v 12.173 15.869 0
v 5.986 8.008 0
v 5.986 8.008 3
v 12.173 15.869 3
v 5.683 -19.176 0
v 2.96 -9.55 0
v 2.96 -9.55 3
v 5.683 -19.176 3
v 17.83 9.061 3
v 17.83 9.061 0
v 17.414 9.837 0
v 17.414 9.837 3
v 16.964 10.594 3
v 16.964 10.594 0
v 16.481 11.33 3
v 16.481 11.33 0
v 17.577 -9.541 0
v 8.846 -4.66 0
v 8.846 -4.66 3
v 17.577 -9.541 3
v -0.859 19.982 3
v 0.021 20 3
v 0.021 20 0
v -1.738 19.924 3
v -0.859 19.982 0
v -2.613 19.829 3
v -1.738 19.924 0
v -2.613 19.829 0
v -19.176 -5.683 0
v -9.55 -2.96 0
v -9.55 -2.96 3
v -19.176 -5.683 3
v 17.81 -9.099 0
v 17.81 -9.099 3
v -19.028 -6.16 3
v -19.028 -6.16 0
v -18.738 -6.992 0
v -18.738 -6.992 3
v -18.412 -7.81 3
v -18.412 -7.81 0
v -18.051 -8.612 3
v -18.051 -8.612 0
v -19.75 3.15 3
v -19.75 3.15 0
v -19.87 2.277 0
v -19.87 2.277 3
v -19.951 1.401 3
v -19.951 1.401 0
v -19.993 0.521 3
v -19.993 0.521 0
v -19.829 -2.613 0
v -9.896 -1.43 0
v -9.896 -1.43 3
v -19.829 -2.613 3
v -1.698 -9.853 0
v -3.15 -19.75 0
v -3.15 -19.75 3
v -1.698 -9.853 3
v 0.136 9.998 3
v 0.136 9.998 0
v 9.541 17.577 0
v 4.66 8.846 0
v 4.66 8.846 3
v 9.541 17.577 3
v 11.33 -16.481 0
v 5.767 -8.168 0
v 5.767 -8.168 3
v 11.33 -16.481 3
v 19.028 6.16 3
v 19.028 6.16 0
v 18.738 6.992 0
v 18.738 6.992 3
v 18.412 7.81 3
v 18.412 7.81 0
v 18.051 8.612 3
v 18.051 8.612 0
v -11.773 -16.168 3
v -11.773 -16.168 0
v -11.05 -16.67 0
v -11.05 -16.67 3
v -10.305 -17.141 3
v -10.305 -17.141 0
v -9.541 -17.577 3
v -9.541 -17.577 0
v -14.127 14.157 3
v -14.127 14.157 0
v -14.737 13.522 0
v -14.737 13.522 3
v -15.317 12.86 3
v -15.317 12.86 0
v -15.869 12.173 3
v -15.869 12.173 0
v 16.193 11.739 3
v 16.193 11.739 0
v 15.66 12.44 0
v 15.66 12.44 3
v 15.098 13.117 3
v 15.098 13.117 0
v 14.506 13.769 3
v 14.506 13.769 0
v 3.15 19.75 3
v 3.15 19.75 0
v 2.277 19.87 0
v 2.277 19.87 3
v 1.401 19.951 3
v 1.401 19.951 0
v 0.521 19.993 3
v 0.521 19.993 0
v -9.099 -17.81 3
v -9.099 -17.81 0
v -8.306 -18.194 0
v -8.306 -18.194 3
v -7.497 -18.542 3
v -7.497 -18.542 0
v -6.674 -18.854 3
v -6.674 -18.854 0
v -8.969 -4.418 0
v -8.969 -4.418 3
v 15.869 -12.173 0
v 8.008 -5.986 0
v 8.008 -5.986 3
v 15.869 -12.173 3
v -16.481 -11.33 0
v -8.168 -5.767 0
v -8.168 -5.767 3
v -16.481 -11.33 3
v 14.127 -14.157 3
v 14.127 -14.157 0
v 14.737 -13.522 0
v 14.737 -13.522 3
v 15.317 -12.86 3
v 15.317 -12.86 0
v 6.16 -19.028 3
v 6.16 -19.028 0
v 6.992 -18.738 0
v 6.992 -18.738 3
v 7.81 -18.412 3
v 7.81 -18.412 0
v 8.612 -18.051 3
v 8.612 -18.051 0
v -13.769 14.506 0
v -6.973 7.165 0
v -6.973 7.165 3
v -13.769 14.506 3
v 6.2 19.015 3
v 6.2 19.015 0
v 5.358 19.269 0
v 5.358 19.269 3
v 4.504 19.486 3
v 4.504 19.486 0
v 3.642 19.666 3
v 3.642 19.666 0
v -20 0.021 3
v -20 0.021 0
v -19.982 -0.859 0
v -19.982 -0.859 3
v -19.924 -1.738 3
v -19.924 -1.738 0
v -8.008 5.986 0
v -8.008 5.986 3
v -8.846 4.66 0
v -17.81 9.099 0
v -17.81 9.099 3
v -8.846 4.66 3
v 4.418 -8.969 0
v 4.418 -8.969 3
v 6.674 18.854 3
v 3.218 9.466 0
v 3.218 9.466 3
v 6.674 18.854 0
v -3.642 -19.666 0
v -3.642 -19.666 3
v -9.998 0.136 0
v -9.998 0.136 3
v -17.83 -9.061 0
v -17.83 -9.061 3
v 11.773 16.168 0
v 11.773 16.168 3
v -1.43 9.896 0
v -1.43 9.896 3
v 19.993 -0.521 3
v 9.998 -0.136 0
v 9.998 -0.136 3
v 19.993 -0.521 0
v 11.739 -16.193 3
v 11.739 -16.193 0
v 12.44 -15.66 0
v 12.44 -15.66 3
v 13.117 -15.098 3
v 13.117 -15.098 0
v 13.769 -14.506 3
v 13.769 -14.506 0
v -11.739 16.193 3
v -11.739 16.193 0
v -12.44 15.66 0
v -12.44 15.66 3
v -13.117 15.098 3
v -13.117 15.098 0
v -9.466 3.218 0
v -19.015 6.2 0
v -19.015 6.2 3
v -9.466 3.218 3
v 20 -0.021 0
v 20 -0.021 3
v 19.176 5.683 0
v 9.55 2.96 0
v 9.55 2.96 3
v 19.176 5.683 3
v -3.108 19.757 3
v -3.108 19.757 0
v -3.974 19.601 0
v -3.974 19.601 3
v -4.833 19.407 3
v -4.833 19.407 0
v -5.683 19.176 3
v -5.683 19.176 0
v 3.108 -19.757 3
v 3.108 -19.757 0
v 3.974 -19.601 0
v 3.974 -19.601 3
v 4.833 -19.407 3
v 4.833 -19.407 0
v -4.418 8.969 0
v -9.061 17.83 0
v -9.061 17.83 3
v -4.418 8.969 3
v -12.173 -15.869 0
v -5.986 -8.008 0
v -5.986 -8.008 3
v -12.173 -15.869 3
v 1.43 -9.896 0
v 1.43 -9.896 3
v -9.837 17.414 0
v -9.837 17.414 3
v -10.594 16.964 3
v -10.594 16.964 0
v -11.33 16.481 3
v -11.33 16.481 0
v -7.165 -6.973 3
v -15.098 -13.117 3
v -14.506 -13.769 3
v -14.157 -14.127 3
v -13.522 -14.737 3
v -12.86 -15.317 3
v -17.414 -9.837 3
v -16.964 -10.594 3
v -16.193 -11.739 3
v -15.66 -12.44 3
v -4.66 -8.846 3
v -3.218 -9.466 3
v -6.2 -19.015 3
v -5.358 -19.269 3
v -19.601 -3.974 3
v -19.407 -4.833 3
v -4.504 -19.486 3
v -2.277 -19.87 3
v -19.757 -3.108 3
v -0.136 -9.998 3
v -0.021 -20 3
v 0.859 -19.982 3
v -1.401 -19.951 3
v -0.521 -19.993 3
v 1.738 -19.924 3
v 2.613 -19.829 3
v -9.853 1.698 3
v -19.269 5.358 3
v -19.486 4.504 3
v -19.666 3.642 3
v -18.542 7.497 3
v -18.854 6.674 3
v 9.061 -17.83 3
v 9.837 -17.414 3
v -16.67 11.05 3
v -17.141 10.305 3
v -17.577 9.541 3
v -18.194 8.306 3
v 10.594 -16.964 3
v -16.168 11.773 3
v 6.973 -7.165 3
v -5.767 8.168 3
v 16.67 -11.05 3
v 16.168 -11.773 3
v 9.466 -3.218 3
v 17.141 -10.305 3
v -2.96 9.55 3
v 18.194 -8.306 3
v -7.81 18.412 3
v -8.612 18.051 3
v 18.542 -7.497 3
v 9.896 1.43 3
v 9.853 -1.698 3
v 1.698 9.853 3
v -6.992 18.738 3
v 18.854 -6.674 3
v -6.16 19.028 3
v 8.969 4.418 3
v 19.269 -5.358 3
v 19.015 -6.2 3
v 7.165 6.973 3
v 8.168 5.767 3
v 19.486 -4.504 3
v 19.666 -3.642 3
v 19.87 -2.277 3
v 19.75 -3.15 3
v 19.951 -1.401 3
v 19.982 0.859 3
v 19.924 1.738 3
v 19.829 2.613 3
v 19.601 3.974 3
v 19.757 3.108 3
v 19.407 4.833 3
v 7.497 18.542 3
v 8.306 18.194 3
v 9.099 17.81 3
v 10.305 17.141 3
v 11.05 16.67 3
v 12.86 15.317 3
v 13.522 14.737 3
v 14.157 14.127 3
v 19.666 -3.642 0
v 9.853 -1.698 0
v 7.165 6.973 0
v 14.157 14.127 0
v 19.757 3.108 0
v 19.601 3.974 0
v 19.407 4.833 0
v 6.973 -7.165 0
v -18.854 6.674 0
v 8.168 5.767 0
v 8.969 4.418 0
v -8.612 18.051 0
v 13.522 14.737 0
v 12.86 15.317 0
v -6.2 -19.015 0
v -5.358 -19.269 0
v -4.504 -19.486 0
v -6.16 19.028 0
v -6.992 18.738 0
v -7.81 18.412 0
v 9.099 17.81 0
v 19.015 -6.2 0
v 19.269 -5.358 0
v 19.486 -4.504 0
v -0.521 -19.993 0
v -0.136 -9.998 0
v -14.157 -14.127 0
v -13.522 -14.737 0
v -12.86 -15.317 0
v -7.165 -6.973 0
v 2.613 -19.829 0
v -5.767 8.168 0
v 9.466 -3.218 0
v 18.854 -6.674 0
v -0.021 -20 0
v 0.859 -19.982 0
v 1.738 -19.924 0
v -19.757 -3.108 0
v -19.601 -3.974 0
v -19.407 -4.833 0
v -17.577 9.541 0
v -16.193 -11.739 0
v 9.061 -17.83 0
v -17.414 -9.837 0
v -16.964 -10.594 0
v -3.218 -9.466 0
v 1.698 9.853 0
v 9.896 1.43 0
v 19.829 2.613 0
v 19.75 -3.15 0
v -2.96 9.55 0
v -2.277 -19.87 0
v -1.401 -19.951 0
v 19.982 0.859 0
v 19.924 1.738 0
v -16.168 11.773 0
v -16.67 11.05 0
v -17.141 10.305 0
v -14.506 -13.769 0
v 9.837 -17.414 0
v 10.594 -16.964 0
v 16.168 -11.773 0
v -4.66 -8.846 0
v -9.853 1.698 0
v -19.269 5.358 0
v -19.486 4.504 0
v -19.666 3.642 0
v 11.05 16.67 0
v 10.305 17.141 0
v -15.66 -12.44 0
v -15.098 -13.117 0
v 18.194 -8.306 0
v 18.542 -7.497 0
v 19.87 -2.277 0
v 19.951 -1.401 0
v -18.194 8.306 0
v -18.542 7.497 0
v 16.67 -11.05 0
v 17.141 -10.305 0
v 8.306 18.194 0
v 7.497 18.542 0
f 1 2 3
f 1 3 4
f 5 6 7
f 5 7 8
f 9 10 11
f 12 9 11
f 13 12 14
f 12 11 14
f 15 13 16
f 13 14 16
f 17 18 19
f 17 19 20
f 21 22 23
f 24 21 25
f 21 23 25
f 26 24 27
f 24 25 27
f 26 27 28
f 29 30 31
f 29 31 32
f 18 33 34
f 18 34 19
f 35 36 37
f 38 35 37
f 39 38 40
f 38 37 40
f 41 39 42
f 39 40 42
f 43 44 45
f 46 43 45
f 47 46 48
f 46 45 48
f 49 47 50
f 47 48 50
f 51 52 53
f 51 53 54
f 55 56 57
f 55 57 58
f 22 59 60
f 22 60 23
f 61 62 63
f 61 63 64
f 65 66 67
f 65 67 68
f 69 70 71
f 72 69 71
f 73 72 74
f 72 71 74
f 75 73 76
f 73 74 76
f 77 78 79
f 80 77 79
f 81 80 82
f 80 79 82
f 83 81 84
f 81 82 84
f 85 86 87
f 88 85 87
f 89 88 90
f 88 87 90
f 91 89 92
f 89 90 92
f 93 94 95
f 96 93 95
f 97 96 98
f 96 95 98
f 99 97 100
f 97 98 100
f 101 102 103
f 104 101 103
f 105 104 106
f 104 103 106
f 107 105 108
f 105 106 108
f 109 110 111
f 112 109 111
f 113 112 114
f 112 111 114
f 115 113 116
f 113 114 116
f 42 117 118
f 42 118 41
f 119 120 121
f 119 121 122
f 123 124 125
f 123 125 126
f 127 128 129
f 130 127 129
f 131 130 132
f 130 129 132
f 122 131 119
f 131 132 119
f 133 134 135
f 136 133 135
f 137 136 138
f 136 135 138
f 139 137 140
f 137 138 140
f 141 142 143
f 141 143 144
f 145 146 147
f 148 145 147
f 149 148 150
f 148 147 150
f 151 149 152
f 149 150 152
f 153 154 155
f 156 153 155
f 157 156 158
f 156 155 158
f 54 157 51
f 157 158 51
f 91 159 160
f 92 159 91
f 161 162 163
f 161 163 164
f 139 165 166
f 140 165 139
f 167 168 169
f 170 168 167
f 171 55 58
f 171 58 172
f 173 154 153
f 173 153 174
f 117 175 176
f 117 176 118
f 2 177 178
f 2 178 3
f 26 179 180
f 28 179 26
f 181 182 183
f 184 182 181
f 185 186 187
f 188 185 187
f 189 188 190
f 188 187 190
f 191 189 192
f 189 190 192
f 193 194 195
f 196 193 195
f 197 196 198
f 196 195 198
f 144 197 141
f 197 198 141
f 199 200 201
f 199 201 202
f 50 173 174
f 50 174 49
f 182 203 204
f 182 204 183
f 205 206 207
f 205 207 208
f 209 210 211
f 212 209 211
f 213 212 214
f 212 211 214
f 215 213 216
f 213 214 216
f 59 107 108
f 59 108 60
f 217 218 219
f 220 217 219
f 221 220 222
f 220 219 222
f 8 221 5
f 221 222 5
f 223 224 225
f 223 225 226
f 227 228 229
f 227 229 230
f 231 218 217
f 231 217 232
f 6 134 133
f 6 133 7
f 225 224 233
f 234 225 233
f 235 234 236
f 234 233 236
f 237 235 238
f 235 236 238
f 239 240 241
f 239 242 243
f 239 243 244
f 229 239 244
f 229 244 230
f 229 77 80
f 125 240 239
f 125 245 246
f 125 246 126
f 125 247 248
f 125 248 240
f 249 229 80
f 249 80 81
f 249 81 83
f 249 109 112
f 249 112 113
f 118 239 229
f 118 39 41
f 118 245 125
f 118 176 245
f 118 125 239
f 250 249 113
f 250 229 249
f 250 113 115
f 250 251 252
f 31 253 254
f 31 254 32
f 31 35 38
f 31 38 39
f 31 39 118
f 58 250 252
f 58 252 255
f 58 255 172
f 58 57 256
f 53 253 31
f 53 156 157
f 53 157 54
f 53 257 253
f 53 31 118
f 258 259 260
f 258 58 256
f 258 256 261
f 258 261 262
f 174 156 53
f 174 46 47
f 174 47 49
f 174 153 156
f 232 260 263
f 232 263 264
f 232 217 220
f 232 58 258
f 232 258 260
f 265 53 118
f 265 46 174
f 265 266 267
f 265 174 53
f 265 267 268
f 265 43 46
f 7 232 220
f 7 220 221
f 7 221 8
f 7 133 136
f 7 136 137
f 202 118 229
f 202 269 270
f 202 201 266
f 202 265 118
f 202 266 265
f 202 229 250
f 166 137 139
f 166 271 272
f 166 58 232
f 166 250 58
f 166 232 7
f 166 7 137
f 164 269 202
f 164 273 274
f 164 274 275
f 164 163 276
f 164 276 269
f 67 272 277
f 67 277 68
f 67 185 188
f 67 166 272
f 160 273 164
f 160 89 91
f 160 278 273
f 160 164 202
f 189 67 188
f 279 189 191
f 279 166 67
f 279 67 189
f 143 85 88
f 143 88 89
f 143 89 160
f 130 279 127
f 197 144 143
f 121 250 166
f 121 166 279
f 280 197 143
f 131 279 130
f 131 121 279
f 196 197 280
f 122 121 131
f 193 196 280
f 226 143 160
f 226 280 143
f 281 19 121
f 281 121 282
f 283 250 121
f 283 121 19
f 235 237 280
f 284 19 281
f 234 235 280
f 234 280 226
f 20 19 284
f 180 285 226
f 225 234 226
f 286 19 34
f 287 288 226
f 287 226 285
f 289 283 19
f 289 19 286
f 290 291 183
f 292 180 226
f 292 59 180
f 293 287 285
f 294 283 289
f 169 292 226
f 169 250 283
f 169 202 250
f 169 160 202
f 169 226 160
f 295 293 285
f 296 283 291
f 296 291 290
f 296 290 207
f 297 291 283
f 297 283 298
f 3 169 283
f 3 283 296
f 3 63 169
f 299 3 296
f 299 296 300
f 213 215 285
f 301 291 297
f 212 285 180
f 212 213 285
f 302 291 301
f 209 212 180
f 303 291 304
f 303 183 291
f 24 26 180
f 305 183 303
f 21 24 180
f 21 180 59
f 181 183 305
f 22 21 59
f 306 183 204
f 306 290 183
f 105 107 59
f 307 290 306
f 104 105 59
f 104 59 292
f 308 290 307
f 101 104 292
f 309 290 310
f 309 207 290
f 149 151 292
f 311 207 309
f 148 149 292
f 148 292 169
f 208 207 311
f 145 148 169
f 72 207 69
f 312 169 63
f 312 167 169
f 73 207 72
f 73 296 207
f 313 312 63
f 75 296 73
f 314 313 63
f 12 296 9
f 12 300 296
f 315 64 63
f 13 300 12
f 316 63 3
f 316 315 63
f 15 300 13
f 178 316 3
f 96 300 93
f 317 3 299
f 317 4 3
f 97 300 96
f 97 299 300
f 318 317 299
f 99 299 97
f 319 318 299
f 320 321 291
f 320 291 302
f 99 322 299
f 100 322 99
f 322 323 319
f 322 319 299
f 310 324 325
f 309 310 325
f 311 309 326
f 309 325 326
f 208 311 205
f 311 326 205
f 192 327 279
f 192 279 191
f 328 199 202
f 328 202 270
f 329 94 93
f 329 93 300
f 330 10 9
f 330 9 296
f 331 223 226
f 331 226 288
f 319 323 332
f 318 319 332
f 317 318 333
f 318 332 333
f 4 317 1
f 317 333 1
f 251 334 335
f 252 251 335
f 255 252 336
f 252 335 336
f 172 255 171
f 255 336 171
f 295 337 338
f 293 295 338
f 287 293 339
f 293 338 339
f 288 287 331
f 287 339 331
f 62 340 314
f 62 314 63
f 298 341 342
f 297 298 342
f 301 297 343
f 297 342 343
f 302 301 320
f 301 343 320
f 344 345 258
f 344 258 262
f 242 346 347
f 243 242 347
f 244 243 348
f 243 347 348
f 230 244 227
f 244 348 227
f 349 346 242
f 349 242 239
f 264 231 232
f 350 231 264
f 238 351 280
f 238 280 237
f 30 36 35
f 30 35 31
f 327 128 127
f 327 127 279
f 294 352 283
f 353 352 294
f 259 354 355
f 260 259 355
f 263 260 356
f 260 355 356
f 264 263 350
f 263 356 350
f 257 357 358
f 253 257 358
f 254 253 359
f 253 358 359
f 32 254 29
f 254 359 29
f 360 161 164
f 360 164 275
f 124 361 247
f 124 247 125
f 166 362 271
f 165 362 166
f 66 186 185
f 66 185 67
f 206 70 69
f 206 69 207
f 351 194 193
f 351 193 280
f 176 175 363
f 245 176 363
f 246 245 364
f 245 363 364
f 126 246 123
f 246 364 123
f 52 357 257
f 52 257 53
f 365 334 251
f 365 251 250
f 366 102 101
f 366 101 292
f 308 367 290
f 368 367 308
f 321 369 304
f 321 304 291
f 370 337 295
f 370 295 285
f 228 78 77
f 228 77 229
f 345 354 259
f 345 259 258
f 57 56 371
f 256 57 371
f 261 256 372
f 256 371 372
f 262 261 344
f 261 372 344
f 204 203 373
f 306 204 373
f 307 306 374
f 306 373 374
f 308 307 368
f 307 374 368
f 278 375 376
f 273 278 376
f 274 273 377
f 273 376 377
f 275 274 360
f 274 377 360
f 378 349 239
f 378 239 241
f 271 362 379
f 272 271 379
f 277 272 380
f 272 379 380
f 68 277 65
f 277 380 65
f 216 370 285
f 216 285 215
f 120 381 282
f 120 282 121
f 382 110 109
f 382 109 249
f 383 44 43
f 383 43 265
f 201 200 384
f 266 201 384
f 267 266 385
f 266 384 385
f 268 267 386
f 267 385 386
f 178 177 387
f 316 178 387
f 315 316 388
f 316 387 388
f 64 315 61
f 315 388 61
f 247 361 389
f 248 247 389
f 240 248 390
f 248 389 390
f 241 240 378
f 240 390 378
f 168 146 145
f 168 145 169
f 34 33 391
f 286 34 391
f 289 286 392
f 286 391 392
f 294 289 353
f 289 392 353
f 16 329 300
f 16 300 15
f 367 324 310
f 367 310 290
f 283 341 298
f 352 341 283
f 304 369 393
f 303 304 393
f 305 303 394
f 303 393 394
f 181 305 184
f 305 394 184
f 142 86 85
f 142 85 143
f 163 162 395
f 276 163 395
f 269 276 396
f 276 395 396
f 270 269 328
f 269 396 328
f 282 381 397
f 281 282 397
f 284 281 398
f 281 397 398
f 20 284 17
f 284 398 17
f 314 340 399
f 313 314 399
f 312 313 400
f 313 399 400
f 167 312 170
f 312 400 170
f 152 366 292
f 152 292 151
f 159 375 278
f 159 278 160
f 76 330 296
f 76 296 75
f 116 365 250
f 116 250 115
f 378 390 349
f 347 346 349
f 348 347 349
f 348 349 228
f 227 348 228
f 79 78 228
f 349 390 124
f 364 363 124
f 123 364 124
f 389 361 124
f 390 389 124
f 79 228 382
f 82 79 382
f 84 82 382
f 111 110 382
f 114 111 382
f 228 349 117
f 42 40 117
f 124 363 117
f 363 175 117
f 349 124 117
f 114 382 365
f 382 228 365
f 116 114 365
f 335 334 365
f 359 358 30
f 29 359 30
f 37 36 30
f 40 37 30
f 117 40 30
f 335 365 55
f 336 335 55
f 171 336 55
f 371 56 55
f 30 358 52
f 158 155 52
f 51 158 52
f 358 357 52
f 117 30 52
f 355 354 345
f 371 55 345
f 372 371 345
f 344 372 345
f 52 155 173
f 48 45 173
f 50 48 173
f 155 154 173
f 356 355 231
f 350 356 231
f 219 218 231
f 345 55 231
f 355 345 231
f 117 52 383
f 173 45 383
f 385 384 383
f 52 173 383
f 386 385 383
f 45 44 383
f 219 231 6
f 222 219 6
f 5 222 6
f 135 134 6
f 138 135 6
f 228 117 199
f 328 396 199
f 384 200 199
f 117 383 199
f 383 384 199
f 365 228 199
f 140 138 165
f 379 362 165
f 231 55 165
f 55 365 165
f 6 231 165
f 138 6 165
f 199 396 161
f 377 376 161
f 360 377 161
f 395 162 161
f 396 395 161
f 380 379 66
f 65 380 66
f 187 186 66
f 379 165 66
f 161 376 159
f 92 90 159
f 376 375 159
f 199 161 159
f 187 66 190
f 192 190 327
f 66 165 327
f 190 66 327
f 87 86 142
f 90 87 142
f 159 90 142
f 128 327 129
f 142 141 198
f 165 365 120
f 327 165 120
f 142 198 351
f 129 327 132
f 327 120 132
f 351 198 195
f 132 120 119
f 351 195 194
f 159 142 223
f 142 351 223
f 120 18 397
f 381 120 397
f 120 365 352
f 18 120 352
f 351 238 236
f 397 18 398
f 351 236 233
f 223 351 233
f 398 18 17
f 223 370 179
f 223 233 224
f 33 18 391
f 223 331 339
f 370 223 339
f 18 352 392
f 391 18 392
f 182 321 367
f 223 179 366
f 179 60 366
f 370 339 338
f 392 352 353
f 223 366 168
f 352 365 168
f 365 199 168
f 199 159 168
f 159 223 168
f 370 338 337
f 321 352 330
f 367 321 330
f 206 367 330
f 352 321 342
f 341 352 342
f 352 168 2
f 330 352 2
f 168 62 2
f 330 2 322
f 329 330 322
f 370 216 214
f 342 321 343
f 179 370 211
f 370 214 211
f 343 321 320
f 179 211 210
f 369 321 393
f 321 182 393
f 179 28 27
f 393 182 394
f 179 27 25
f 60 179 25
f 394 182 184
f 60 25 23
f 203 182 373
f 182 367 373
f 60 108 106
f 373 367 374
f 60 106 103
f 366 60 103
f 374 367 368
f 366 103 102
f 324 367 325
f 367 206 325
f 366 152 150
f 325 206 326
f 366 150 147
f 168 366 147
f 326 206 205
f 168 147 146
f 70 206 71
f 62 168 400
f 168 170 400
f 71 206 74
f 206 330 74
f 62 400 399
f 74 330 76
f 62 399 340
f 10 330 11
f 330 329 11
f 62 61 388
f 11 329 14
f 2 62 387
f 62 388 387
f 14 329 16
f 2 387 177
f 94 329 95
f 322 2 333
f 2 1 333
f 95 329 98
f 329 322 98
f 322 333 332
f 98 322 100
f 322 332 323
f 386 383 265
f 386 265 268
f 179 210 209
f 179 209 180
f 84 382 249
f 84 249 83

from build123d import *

# Parameters (mm, degrees)
SKETCH1_R           = 20
BOSS_EXTRUDE1_DEPTH = 3
CUT_EXTRUDE5_DEPTH  = 29.442925307
CIRPATTERN1_DEPTH   = 3


# Read off the part's stored shape, not the designer's step: CirPattern1
with BuildPart() as part:
    # Sketch1 → Boss-Extrude1 (new body)
    with BuildSketch(Plane.XY):
        Circle(SKETCH1_R)
    extrude(amount=BOSS_EXTRUDE1_DEPTH)

    # Sketch2 → Cut-Extrude5 (cut, through all)
    with BuildSketch(Plane.XY.offset(3)):
        Polygon((0.021198778, 19.999988765), (0.521152809, 19.993208841), (0.135577303, 9.997518193), align=None)
    extrude(amount=-CUT_EXTRUDE5_DEPTH, mode=Mode.SUBTRACT)


with BuildPart() as cut_extrude5_kept_piece:
    # of the separate pieces the step leaves, the one the design keeps (cut_extrude5_pieces_kept)
    add(part.part.solids().sort_by_distance((20, 0, 0))[0])

    # CirPattern1 outline → CirPattern1 (cut)
    with BuildSketch(Plane.XY):
        with BuildLine():
            Line((-3.107749756, 19.757071931), (-1.430048289, 9.895641117))
            Line((-1.430048289, 9.895641117), (-2.612890376, 19.828585521))
            ThreePointArc((-2.612890376, 19.828585521), (-2.860543555, 19.794375222), (-3.107749756, 19.757071931))
        make_face()
        with BuildLine():
            Line((1.697864531, 9.853223191), (3.642363483, 19.665533006))
            ThreePointArc((3.642363483, 19.665533006), (3.396259749, 19.709526119), (3.149625329, 19.750439499))
            Line((3.149625329, 19.750439499), (1.697864531, 9.853223191))
        make_face()
        with BuildLine():
            Line((3.2183447, 9.466309133), (6.673887081, 18.853626482))
            ThreePointArc((6.673887081, 18.853626482), (6.437695332, 18.935577073), (6.200497654, 19.014568864))
            Line((6.200497654, 19.014568864), (3.2183447, 9.466309133))
        make_face()
        with BuildLine():
            Line((4.659578542, 8.846303128), (9.541077431, 17.577481101))
            ThreePointArc((9.541077431, 17.577481101), (9.320613491, 17.695371275), (9.098693148, 17.810496438))
            Line((9.098693148, 17.810496438), (4.659578542, 8.846303128))
        make_face()
        with BuildLine():
            Line((5.986078095, 8.00847178), (12.17333479, 15.868519799))
            ThreePointArc((12.17333479, 15.868519799), (11.974027213, 16.019446707), (11.772848622, 16.167870479))
            Line((11.772848622, 16.167870479), (5.986078095, 8.00847178))
        make_face()
        with BuildLine():
            Line((7.165180539, 6.973445279), (14.505844245, 13.768822875))
            ThreePointArc((14.505844245, 13.768822875), (14.332600646, 13.949070196), (14.15711749, 14.127137891))
            Line((14.15711749, 14.127137891), (7.165180539, 6.973445279))
        make_face()
        with BuildLine():
            Line((8.167852459, 5.766709411), (16.481171674, 11.330091834))
            ThreePointArc((16.481171674, 11.330091834), (16.338257884, 11.535221282), (16.192791142, 11.73854828))
            Line((16.192791142, 11.73854828), (8.167852459, 5.766709411))
        make_face()
        with BuildLine():
            Line((8.969404743, 4.417978019), (18.050677958, 8.612376328))
            ThreePointArc((18.050677958, 8.612376328), (17.94161299, 8.837336935), (17.829744535, 9.060916653))
            Line((17.829744535, 9.060916653), (8.969404743, 4.417978019))
        make_face()
        with BuildLine():
            Line((9.550100515, 2.960461346), (19.175716644, 5.682595535))
            ThreePointArc((19.175716644, 5.682595535), (19.103186038, 5.921848023), (19.027670443, 6.160175186))
            Line((19.027670443, 6.160175186), (9.550100515, 2.960461346))
        make_face()
        with BuildLine():
            Line((9.895641117, 1.430048289), (19.828585545, 2.612890379))
            ThreePointArc((19.828585545, 2.612890379), (19.794375247, 2.860543558), (19.757071956, 3.10774976))
            Line((19.757071956, 3.10774976), (9.895641117, 1.430048289))
        make_face()
        with BuildLine():
            Line((9.997518193, -0.135577303), (19.993208862, -0.52115281))
            ThreePointArc((19.993208862, -0.52115281), (19.998161242, -0.271196982), (19.999988787, -0.021198778))
            Line((19.999988787, -0.021198778), (9.997518193, -0.135577303))
        make_face()
        with BuildLine():
            Line((9.853223191, -1.697864531), (19.665533023, -3.642363486))
            ThreePointArc((19.665533023, -3.642363486), (19.709526137, -3.396259752), (19.750439517, -3.149625332))
            Line((19.750439517, -3.149625332), (9.853223191, -1.697864531))
        make_face()
        with BuildLine():
            Line((9.466309133, -3.2183447), (18.853626494, -6.673887086))
            ThreePointArc((18.853626494, -6.673887086), (18.935577086, -6.437695337), (19.014568878, -6.200497658))
            Line((19.014568878, -6.200497658), (9.466309133, -3.2183447))
        make_face()
        with BuildLine():
            Line((8.846303128, -4.659578542), (17.577481109, -9.541077435))
            ThreePointArc((17.577481109, -9.541077435), (17.695371283, -9.320613495), (17.810496447, -9.098693153))
            Line((17.810496447, -9.098693153), (8.846303128, -4.659578542))
        make_face()
        with BuildLine():
            Line((8.00847178, -5.986078095), (15.868519802, -12.173334792))
            ThreePointArc((15.868519802, -12.173334792), (16.019446711, -11.974027216), (16.167870483, -11.772848624))
            Line((16.167870483, -11.772848624), (8.00847178, -5.986078095))
        make_face()
        with BuildLine():
            Line((6.973445279, -7.165180539), (13.768822874, -14.505844245))
            ThreePointArc((13.768822874, -14.505844245), (13.949070196, -14.332600646), (14.127137891, -14.15711749))
            Line((14.127137891, -14.15711749), (6.973445279, -7.165180539))
        make_face()
        with BuildLine():
            Line((5.766709411, -8.167852459), (11.330091831, -16.481171669))
            ThreePointArc((11.330091831, -16.481171669), (11.535221279, -16.33825788), (11.738548277, -16.192791138))
            Line((11.738548277, -16.192791138), (5.766709411, -8.167852459))
        make_face()
        with BuildLine():
            Line((4.417978019, -8.969404743), (8.612376324, -18.050677949))
            ThreePointArc((8.612376324, -18.050677949), (8.83733693, -17.941612981), (9.060916649, -17.829744526))
            Line((9.060916649, -17.829744526), (4.417978019, -8.969404743))
        make_face()
        with BuildLine():
            Line((2.960461346, -9.550100515), (5.682595531, -19.17571663))
            ThreePointArc((5.682595531, -19.17571663), (5.921848019, -19.103186025), (6.160175182, -19.02767043))
            Line((6.160175182, -19.02767043), (2.960461346, -9.550100515))
        make_face()
        with BuildLine():
            Line((1.430048289, -9.895641117), (2.612890376, -19.828585527))
            ThreePointArc((2.612890376, -19.828585527), (2.860543556, -19.794375229), (3.107749758, -19.757071938))
            Line((3.107749758, -19.757071938), (1.430048289, -9.895641117))
        make_face()
        with BuildLine():
            Line((-0.135577303, -9.997518193), (-0.521152809, -19.99320884))
            ThreePointArc((-0.521152809, -19.99320884), (-0.271196982, -19.99816122), (-0.021198778, -19.999988765))
            Line((-0.021198778, -19.999988765), (-0.135577303, -9.997518193))
        make_face()
        with BuildLine():
            Line((-1.697864531, -9.853223191), (-3.642363481, -19.665532998))
            ThreePointArc((-3.642363481, -19.665532998), (-3.396259748, -19.709526112), (-3.149625328, -19.750439493))
            Line((-3.149625328, -19.750439493), (-1.697864531, -9.853223191))
        make_face()
        with BuildLine():
            Line((-3.2183447, -9.466309133), (-6.673887077, -18.853626468))
            ThreePointArc((-6.673887077, -18.853626468), (-6.437695328, -18.93557706), (-6.20049765, -19.014568852))
            Line((-6.20049765, -19.014568852), (-3.2183447, -9.466309133))
        make_face()
        with BuildLine():
            Line((-4.659578542, -8.846303128), (-9.541077421, -17.577481083))
            ThreePointArc((-9.541077421, -17.577481083), (-9.320613482, -17.695371257), (-9.098693139, -17.810496421))
            Line((-9.098693139, -17.810496421), (-4.659578542, -8.846303128))
        make_face()
        with BuildLine():
            Line((-5.986078095, -8.00847178), (-12.173334774, -15.868519778))
            ThreePointArc((-12.173334774, -15.868519778), (-11.974027198, -16.019446687), (-11.772848606, -16.167870459))
            Line((-11.772848606, -16.167870459), (-5.986078095, -8.00847178))
        make_face()
        with BuildLine():
            Line((-7.165180539, -6.973445279), (-14.505844222, -13.768822853))
            ThreePointArc((-14.505844222, -13.768822853), (-14.332600623, -13.949070175), (-14.157117468, -14.127137869))
            Line((-14.157117468, -14.127137869), (-7.165180539, -6.973445279))
        make_face()
        with BuildLine():
            Line((-8.167852459, -5.766709411), (-16.481171644, -11.330091814))
            ThreePointArc((-16.481171644, -11.330091814), (-16.338257855, -11.535221261), (-16.192791114, -11.738548259))
            Line((-16.192791114, -11.738548259), (-8.167852459, -5.766709411))
        make_face()
        with BuildLine():
            Line((-8.969404743, -4.417978019), (-18.050677923, -8.612376311))
            ThreePointArc((-18.050677923, -8.612376311), (-17.941612955, -8.837336918), (-17.8297445, -9.060916636))
            Line((-17.8297445, -9.060916636), (-8.969404743, -4.417978019))
        make_face()
        with BuildLine():
            Line((-9.550100515, -2.960461346), (-19.175716604, -5.682595523))
            ThreePointArc((-19.175716604, -5.682595523), (-19.103185999, -5.921848011), (-19.027670404, -6.160175173))
            Line((-19.027670404, -6.160175173), (-9.550100515, -2.960461346))
        make_face()
        with BuildLine():
            Line((-9.895641117, -1.430048289), (-19.828585502, -2.612890373))
            ThreePointArc((-19.828585502, -2.612890373), (-19.794375204, -2.860543552), (-19.757071914, -3.107749754))
            Line((-19.757071914, -3.107749754), (-9.895641117, -1.430048289))
        make_face()
        with BuildLine():
            Line((-9.997518193, 0.135577303), (-19.993208819, 0.521152808))
            ThreePointArc((-19.993208819, 0.521152808), (-19.998161198, 0.271196981), (-19.999988743, 0.021198778))
            Line((-19.999988743, 0.021198778), (-9.997518193, 0.135577303))
        make_face()
        with BuildLine():
            Line((-9.853223191, 1.697864531), (-19.665532981, 3.642363478))
            ThreePointArc((-19.665532981, 3.642363478), (-19.709526095, 3.396259745), (-19.750439475, 3.149625326))
            Line((-19.750439475, 3.149625326), (-9.853223191, 1.697864531))
        make_face()
        with BuildLine():
            Line((-9.466309133, 3.2183447), (-18.853626455, 6.673887072))
            ThreePointArc((-18.853626455, 6.673887072), (-18.935577047, 6.437695323), (-19.014568838, 6.200497646))
            Line((-19.014568838, 6.200497646), (-9.466309133, 3.2183447))
        make_face()
        with BuildLine():
            Line((-8.846303128, 4.659578542), (-17.577481075, 9.541077417))
            ThreePointArc((-17.577481075, 9.541077417), (-17.695371249, 9.320613477), (-17.810496412, 9.098693135))
            Line((-17.810496412, 9.098693135), (-8.846303128, 4.659578542))
        make_face()
        with BuildLine():
            Line((-8.00847178, 5.986078095), (-15.868519775, 12.173334771))
            ThreePointArc((-15.868519775, 12.173334771), (-16.019446683, 11.974027195), (-16.167870455, 11.772848604))
            Line((-16.167870455, 11.772848604), (-8.00847178, 5.986078095))
        make_face()
        with BuildLine():
            Line((-6.973445279, 7.165180539), (-13.768822853, 14.505844223))
            ThreePointArc((-13.768822853, 14.505844223), (-13.949070175, 14.332600624), (-14.127137869, 14.157117468))
            Line((-14.127137869, 14.157117468), (-6.973445279, 7.165180539))
        make_face()
        with BuildLine():
            Line((-5.766709411, 8.167852459), (-11.330091817, 16.481171649))
            ThreePointArc((-11.330091817, 16.481171649), (-11.535221264, 16.338257859), (-11.738548262, 16.192791117))
            Line((-11.738548262, 16.192791117), (-5.766709411, 8.167852459))
        make_face()
        with BuildLine():
            Line((-4.417978019, 8.969404743), (-8.612376316, 18.050677932))
            ThreePointArc((-8.612376316, 18.050677932), (-8.837336922, 17.941612963), (-9.06091664, 17.829744508))
            Line((-9.06091664, 17.829744508), (-4.417978019, 8.969404743))
        make_face()
        with BuildLine():
            Line((-2.960461346, 9.550100515), (-5.682595527, 19.175716618))
            ThreePointArc((-5.682595527, 19.175716618), (-5.921848015, 19.103186012), (-6.160175178, 19.027670417))
            Line((-6.160175178, 19.027670417), (-2.960461346, 9.550100515))
        make_face()
    extrude(amount=CIRPATTERN1_DEPTH, mode=Mode.SUBTRACT)


solid = cut_extrude5_kept_piece.part
